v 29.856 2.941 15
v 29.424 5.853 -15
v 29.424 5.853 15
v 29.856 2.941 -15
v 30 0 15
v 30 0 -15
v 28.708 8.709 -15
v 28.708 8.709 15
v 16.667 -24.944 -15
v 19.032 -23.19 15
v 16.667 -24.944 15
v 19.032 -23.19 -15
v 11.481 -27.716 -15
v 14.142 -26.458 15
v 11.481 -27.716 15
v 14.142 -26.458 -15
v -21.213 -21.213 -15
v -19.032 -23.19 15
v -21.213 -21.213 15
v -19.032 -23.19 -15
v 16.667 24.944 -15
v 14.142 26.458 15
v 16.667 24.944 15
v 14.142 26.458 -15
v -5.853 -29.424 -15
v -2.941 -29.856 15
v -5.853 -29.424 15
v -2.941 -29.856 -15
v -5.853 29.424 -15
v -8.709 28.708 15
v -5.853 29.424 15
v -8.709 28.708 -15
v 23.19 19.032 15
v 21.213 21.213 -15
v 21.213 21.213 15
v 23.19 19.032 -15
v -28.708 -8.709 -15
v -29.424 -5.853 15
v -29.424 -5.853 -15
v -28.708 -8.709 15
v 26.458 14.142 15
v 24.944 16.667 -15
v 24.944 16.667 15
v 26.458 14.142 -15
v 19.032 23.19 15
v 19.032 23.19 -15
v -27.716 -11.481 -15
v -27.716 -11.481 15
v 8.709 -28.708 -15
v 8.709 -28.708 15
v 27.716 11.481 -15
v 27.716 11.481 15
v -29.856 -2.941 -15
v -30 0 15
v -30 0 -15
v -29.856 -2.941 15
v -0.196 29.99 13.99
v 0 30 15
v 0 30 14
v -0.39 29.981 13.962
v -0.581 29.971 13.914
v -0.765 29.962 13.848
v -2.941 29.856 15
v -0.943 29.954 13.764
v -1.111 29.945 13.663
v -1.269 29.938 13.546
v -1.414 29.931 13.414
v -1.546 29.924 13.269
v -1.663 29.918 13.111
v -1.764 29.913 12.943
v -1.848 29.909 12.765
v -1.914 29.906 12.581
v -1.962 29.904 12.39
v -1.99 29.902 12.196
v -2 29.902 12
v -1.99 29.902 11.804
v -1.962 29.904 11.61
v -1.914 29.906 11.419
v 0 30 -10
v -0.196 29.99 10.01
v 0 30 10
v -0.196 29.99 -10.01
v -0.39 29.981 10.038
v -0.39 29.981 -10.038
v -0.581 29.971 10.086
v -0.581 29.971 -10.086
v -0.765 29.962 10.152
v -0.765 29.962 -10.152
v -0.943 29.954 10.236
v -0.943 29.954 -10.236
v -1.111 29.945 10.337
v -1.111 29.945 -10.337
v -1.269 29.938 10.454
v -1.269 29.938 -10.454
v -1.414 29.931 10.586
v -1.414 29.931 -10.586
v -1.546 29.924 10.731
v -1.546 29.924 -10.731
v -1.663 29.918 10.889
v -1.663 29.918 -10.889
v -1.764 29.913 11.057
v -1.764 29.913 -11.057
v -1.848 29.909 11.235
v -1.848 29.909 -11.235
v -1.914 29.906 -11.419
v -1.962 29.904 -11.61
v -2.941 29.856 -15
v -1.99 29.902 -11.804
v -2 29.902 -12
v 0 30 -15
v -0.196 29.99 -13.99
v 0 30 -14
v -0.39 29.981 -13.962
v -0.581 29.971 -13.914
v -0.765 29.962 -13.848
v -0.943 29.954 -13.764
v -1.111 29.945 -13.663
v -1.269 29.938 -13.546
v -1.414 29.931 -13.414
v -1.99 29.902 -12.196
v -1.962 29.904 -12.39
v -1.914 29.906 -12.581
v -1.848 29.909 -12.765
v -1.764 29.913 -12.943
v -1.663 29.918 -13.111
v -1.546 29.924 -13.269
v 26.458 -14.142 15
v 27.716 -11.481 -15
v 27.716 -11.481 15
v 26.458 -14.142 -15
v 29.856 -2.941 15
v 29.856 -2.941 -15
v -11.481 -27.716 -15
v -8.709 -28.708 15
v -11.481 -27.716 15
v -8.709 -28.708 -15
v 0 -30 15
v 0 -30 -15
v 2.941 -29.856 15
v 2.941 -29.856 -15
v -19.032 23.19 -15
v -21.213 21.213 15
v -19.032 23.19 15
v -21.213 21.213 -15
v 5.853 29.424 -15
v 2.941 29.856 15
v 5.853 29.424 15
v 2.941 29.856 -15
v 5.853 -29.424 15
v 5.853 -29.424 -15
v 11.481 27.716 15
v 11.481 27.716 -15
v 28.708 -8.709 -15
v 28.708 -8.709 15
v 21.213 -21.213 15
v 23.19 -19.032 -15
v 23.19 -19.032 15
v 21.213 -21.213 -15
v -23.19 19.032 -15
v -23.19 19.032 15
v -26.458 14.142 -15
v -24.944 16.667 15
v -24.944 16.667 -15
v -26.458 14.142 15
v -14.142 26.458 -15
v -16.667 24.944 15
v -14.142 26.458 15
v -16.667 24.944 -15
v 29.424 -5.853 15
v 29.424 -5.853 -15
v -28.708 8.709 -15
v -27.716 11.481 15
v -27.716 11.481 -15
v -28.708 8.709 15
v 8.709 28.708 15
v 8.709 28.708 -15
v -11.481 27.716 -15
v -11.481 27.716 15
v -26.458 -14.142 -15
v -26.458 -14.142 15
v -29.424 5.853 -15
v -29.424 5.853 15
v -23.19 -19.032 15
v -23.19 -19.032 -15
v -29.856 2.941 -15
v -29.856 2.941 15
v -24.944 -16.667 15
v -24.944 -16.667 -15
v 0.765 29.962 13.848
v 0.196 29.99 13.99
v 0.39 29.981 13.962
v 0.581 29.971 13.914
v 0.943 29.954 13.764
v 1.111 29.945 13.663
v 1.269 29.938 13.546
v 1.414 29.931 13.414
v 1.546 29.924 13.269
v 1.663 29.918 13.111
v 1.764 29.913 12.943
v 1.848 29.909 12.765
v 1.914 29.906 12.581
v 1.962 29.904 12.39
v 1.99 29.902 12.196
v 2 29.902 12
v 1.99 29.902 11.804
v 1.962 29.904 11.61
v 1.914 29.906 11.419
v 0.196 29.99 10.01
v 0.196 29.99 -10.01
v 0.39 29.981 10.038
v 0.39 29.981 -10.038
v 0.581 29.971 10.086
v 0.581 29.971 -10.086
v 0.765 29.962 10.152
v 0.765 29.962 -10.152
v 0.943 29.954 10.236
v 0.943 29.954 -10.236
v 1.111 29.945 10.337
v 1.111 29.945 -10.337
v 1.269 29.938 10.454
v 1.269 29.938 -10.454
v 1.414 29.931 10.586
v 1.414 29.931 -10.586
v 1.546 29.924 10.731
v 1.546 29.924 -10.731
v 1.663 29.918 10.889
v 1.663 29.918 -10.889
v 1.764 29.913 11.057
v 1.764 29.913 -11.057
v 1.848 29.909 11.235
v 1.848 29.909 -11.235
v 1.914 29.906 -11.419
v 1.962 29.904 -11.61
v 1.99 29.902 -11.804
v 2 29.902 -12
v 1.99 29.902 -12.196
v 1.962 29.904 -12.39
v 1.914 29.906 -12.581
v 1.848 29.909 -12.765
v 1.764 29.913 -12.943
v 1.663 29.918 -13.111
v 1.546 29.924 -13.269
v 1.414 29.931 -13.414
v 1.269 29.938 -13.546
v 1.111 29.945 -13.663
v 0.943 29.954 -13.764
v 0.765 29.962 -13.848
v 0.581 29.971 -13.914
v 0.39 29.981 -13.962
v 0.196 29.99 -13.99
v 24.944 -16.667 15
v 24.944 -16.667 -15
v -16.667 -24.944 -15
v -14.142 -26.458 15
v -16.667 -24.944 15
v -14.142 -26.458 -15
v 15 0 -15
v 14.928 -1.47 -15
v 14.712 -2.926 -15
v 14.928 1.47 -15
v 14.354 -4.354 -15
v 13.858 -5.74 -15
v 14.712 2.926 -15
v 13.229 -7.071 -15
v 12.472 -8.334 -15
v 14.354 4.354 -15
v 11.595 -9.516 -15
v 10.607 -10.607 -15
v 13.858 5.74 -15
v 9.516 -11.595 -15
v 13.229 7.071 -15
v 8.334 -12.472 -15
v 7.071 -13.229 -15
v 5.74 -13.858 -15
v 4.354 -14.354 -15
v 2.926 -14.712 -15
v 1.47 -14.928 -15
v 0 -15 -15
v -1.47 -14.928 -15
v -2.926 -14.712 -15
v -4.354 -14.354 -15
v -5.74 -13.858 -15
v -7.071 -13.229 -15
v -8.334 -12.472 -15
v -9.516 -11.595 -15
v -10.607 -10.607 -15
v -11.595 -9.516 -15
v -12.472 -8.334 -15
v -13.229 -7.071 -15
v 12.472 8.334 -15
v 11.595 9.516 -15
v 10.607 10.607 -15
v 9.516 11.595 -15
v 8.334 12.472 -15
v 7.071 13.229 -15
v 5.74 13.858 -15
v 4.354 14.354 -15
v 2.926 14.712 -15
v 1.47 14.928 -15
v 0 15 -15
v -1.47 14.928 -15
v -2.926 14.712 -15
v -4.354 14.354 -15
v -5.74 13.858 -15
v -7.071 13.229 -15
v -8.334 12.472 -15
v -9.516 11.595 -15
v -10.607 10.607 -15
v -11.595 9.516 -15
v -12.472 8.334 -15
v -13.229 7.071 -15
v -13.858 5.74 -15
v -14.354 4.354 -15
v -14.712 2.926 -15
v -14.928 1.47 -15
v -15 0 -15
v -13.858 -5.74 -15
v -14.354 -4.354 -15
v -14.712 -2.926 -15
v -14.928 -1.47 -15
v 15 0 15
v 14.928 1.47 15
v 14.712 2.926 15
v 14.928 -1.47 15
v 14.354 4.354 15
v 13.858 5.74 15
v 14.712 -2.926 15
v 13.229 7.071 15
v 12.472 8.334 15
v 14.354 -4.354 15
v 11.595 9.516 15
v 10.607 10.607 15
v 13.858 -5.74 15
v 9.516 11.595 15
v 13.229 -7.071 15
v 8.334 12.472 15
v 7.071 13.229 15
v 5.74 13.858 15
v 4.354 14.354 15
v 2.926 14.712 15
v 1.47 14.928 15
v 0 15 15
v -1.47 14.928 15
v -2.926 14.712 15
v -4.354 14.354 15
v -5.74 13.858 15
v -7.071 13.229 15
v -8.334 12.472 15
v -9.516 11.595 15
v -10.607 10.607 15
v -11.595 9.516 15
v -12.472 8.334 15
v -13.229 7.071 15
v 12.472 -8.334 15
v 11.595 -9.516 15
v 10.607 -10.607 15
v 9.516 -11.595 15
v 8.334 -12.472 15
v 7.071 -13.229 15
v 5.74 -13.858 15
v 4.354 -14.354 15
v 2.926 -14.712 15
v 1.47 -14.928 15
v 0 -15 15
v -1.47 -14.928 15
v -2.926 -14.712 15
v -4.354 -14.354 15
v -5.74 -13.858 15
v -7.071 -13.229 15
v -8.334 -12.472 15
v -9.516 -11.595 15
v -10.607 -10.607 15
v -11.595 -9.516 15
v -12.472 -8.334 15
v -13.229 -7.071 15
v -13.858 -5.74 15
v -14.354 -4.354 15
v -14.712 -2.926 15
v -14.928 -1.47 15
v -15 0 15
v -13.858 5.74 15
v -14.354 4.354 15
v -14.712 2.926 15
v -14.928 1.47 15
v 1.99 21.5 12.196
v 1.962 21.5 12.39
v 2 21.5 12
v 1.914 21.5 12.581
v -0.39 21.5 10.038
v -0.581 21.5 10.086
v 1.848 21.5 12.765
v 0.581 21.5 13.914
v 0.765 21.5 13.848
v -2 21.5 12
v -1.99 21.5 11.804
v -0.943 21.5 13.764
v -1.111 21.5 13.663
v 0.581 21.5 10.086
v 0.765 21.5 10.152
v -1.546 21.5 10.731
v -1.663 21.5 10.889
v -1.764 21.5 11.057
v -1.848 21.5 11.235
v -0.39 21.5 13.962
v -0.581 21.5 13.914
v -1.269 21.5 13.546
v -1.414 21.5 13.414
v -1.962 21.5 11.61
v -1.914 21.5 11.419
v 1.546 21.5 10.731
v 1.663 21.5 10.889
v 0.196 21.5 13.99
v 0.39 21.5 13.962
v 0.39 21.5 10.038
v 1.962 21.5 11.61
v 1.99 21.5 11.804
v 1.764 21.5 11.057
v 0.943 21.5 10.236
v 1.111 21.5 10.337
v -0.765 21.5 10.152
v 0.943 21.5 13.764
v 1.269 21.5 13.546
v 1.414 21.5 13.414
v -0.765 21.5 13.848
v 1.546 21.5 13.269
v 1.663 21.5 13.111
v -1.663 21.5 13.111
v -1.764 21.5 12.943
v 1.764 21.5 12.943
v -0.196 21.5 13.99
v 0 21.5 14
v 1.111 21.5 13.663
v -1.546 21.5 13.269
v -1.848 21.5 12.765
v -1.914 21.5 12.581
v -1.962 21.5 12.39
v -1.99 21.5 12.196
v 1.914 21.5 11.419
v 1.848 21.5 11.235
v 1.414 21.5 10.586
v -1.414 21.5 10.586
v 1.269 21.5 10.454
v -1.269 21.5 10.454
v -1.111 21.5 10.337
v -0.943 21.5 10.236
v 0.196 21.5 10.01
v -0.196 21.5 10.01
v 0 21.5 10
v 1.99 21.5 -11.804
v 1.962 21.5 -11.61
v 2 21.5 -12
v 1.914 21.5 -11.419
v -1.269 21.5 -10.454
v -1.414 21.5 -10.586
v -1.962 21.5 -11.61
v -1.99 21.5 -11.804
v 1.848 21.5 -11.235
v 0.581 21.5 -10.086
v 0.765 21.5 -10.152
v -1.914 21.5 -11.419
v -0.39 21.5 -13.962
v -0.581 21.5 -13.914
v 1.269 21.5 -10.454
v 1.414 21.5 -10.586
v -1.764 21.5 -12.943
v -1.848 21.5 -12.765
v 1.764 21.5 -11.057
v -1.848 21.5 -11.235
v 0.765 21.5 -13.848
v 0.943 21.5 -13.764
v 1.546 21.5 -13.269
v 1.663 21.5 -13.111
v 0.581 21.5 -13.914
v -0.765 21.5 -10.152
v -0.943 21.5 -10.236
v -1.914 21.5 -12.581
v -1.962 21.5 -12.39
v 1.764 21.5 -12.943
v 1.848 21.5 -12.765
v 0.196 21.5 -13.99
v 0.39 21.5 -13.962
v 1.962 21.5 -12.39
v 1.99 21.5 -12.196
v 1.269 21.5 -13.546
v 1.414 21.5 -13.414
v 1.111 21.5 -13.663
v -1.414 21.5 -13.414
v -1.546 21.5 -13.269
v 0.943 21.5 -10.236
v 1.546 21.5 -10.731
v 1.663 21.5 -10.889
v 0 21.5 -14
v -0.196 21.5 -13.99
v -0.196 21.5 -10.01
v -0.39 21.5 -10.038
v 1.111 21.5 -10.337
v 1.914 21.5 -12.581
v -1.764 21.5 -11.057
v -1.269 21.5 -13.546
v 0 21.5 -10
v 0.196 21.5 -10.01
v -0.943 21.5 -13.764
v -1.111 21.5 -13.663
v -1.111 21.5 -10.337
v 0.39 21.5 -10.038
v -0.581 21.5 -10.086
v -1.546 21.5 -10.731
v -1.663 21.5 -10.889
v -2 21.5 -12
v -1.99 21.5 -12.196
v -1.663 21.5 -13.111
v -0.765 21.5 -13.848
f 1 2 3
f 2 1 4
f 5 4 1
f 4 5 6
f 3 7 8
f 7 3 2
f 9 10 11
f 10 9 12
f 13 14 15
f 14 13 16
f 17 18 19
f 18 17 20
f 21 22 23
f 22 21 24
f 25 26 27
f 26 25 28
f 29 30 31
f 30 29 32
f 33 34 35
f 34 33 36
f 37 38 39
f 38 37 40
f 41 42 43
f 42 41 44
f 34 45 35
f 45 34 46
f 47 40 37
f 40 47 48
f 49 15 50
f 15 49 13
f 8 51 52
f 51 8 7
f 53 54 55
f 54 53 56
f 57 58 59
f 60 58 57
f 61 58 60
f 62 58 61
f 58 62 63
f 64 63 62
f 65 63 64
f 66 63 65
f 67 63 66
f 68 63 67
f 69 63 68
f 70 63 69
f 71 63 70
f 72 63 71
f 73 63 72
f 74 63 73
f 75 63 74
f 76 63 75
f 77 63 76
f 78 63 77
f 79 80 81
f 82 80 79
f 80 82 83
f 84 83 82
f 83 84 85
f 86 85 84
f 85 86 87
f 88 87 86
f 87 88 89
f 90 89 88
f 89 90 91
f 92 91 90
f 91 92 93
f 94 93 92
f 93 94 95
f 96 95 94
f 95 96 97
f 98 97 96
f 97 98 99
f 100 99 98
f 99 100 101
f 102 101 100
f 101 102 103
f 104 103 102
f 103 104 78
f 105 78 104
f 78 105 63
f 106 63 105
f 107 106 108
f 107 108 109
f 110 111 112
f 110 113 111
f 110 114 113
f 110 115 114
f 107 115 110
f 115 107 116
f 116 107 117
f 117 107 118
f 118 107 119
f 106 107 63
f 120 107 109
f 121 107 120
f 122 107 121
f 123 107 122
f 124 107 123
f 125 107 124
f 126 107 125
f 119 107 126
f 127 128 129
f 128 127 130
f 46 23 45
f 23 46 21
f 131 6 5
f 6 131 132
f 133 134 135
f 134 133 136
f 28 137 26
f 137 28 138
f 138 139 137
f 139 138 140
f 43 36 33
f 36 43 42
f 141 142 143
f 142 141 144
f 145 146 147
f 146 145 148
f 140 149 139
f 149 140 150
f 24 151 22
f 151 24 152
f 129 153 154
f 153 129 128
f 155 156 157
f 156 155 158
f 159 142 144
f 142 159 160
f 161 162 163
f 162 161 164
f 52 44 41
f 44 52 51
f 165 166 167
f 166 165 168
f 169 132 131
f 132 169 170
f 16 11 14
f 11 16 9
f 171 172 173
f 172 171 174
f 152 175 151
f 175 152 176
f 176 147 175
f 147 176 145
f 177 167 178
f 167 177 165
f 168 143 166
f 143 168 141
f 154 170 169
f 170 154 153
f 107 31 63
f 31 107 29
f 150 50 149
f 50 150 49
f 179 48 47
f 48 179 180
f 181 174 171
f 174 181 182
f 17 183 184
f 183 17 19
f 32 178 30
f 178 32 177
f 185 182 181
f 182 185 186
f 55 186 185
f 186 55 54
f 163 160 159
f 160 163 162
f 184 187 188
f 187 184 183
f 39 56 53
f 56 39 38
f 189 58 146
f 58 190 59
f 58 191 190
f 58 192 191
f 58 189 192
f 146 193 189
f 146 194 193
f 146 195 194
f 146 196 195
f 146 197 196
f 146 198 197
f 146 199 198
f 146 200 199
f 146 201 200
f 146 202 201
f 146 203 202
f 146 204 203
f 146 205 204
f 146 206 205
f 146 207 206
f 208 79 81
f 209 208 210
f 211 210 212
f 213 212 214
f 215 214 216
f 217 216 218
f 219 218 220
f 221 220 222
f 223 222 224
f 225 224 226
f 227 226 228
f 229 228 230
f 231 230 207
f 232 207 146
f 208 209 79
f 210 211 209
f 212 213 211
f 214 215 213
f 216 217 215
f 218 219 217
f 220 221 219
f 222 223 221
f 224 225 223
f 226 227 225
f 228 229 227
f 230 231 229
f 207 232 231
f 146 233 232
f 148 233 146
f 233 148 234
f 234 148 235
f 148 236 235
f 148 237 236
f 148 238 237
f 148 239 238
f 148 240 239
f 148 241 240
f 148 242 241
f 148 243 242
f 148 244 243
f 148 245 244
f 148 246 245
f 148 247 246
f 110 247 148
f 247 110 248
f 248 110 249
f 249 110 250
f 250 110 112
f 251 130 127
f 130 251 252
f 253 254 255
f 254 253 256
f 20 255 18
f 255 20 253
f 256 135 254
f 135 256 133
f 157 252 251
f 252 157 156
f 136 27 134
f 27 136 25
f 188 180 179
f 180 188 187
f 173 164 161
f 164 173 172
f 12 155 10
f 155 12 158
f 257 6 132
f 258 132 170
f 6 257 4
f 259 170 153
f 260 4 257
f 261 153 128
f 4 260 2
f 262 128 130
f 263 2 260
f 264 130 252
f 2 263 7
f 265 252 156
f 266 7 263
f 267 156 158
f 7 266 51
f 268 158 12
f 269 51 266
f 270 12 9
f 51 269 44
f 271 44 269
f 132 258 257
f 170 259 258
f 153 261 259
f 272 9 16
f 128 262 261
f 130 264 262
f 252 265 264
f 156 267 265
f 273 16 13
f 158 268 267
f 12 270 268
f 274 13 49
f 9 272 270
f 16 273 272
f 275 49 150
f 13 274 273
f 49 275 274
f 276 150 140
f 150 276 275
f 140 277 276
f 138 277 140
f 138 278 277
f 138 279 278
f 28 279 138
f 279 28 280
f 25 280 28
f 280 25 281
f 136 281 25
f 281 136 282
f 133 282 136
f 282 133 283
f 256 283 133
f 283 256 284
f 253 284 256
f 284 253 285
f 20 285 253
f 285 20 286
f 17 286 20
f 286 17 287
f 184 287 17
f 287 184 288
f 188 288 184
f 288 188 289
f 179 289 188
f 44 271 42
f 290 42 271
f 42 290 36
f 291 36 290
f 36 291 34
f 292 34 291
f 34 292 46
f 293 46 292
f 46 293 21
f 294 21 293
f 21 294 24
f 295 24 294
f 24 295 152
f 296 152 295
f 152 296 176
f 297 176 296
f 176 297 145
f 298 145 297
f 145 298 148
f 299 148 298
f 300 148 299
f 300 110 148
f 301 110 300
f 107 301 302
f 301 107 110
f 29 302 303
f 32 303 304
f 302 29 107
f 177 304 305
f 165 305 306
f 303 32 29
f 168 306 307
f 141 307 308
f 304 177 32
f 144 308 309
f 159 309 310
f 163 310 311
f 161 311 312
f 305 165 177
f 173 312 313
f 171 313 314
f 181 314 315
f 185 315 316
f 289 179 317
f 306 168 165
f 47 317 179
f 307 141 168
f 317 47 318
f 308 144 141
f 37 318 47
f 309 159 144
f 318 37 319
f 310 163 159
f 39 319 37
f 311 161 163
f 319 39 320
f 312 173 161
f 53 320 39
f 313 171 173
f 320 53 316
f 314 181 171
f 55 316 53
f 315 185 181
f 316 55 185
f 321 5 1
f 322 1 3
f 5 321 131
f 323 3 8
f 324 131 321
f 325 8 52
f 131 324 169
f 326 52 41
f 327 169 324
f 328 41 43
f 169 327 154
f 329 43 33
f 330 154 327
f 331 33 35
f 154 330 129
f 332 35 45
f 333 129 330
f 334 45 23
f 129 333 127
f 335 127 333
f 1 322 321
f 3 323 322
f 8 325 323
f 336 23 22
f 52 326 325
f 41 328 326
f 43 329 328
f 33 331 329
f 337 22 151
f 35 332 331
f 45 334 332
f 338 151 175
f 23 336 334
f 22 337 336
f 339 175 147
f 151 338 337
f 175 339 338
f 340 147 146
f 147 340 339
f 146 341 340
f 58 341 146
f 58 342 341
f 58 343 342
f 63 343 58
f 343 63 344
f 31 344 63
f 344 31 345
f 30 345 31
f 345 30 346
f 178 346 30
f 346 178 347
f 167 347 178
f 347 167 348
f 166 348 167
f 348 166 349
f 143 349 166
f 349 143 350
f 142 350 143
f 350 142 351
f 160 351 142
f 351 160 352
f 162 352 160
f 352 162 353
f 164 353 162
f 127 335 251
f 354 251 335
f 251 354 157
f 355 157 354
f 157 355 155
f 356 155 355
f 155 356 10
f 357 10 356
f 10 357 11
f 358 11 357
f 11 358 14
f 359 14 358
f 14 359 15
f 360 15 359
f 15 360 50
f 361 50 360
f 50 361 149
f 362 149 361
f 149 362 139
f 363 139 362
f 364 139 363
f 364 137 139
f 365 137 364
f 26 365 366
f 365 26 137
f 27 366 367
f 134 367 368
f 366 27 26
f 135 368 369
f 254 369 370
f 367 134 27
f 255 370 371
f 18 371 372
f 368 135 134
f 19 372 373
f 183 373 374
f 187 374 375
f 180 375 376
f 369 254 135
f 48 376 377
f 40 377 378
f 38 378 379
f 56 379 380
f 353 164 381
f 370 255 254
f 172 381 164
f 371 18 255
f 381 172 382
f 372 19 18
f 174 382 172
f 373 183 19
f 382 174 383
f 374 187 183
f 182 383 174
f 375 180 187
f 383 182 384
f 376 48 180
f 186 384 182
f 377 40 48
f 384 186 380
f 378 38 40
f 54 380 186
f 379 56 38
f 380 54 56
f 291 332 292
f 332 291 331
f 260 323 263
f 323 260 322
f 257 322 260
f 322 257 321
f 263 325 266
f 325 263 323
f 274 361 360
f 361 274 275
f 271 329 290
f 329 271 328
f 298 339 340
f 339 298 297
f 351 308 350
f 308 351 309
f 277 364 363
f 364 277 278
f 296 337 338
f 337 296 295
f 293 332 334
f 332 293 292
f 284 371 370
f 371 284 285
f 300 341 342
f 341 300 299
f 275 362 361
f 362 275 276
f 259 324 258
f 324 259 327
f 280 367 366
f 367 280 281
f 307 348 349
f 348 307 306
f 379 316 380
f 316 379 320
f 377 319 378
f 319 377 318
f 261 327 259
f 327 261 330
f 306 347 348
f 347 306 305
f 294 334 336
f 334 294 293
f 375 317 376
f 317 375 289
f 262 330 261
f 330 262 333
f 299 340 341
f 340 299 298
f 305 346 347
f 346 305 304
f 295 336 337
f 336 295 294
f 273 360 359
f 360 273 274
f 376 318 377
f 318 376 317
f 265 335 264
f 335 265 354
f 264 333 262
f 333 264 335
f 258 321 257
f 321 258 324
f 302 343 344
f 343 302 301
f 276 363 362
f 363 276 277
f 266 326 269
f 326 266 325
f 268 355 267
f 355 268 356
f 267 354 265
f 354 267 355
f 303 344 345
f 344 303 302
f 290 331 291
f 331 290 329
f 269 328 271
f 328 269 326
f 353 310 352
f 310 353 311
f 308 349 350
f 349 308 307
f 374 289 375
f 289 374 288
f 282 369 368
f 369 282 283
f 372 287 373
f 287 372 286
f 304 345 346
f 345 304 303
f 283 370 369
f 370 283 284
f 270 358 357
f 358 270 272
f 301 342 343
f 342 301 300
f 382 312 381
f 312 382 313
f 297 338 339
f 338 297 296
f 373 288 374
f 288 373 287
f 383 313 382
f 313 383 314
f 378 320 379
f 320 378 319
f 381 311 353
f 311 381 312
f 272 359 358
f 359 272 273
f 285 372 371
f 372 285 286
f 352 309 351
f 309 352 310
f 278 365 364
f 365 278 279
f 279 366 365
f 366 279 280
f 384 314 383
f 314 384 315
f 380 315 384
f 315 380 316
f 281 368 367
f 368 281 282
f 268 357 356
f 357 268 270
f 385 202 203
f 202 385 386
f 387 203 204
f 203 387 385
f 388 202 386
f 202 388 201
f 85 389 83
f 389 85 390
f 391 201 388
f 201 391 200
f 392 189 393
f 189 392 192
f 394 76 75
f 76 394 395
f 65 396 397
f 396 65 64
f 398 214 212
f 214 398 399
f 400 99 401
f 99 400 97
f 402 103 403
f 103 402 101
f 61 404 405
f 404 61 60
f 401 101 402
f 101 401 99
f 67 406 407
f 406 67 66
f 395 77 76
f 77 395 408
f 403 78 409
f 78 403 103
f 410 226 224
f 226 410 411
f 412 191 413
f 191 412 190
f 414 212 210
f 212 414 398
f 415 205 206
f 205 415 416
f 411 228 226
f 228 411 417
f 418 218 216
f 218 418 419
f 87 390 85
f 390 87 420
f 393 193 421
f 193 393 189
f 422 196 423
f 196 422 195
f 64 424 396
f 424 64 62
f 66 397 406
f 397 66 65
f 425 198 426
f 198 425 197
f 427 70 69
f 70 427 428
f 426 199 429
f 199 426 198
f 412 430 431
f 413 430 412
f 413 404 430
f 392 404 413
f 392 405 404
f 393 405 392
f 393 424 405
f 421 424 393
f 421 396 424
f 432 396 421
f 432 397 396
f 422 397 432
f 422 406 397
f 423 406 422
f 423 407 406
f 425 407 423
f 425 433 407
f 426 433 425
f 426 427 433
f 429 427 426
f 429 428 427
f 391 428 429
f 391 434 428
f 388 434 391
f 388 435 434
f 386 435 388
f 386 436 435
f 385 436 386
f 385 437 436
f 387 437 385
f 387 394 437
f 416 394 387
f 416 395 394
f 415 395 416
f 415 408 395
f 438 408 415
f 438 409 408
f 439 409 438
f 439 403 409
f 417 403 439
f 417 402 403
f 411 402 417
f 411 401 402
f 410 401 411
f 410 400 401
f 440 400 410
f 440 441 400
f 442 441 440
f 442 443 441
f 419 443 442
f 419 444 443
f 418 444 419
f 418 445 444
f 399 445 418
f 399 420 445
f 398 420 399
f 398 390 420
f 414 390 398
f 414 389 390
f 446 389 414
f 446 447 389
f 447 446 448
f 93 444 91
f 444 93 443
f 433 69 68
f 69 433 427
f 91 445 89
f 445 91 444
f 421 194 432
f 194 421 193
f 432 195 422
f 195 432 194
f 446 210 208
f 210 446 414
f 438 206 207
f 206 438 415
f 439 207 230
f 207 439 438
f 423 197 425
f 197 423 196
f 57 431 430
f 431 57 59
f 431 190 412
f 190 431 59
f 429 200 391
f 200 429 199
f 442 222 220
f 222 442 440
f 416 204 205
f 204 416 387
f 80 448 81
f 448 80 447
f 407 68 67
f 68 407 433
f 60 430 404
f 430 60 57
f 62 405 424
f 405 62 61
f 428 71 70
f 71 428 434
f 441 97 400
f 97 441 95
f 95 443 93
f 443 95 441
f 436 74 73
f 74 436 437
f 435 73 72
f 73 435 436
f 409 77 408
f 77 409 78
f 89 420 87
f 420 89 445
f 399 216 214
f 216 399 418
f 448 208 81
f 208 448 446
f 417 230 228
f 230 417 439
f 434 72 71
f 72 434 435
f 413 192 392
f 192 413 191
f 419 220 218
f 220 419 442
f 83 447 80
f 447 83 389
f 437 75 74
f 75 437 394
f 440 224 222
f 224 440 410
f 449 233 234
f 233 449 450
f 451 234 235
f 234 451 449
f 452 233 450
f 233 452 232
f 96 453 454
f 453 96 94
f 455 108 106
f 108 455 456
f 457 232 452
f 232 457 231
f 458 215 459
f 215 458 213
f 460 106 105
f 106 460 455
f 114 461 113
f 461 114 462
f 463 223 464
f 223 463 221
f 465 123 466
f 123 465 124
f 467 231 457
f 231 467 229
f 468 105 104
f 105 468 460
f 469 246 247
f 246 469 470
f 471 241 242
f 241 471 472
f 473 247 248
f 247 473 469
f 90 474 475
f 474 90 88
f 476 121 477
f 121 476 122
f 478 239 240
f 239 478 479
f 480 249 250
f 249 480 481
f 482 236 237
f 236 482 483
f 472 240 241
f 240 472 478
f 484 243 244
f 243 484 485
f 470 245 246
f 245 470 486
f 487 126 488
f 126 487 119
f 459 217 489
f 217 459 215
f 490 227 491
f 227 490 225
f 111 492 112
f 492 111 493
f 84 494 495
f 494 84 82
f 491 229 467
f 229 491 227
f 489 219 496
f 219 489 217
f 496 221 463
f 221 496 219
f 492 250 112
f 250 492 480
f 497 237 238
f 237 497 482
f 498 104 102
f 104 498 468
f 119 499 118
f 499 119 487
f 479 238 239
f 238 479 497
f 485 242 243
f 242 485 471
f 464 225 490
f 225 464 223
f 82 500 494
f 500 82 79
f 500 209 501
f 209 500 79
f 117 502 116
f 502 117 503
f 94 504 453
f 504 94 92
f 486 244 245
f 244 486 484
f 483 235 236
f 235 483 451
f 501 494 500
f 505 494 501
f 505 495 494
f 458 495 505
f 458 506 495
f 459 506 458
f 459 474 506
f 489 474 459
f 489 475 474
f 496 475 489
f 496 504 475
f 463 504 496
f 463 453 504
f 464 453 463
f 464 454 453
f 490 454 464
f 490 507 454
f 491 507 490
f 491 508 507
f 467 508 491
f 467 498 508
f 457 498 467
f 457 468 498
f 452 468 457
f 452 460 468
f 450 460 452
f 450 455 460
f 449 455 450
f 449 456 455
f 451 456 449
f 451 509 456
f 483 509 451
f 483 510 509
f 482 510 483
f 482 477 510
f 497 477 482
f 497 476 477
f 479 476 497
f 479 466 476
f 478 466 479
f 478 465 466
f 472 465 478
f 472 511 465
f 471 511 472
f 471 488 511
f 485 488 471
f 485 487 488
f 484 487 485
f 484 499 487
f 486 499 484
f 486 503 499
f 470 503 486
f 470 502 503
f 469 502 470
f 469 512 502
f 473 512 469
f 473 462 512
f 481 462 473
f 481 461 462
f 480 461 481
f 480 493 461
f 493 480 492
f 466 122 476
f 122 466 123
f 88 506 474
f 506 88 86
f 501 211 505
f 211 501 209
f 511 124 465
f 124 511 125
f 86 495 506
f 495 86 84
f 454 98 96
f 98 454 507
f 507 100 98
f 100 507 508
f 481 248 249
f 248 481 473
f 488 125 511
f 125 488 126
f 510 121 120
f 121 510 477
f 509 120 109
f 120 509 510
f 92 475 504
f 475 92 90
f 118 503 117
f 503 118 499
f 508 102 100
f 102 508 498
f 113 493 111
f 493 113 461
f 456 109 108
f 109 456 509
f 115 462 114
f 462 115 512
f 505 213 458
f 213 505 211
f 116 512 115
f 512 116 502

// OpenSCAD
// COBRA Vertebra - C3 V2
// Height: 30.0mm, OD: 60.0mm

$fn = 64;

difference() {
    // Outer cylinder
    cylinder(h=30.0, d=60.0, center=true);
    
    // Inner channel
    cylinder(h=32.0, d=30.0, center=true);

    // Pivot holes
    translate([0, 30.0, 12.0])
    rotate([90, 0, 0])
    cylinder(h=17.0, d=4, center=true);
    
    translate([0, 30.0, -12.0])
    rotate([90, 0, 0])
    cylinder(h=17.0, d=4, center=true);
}
